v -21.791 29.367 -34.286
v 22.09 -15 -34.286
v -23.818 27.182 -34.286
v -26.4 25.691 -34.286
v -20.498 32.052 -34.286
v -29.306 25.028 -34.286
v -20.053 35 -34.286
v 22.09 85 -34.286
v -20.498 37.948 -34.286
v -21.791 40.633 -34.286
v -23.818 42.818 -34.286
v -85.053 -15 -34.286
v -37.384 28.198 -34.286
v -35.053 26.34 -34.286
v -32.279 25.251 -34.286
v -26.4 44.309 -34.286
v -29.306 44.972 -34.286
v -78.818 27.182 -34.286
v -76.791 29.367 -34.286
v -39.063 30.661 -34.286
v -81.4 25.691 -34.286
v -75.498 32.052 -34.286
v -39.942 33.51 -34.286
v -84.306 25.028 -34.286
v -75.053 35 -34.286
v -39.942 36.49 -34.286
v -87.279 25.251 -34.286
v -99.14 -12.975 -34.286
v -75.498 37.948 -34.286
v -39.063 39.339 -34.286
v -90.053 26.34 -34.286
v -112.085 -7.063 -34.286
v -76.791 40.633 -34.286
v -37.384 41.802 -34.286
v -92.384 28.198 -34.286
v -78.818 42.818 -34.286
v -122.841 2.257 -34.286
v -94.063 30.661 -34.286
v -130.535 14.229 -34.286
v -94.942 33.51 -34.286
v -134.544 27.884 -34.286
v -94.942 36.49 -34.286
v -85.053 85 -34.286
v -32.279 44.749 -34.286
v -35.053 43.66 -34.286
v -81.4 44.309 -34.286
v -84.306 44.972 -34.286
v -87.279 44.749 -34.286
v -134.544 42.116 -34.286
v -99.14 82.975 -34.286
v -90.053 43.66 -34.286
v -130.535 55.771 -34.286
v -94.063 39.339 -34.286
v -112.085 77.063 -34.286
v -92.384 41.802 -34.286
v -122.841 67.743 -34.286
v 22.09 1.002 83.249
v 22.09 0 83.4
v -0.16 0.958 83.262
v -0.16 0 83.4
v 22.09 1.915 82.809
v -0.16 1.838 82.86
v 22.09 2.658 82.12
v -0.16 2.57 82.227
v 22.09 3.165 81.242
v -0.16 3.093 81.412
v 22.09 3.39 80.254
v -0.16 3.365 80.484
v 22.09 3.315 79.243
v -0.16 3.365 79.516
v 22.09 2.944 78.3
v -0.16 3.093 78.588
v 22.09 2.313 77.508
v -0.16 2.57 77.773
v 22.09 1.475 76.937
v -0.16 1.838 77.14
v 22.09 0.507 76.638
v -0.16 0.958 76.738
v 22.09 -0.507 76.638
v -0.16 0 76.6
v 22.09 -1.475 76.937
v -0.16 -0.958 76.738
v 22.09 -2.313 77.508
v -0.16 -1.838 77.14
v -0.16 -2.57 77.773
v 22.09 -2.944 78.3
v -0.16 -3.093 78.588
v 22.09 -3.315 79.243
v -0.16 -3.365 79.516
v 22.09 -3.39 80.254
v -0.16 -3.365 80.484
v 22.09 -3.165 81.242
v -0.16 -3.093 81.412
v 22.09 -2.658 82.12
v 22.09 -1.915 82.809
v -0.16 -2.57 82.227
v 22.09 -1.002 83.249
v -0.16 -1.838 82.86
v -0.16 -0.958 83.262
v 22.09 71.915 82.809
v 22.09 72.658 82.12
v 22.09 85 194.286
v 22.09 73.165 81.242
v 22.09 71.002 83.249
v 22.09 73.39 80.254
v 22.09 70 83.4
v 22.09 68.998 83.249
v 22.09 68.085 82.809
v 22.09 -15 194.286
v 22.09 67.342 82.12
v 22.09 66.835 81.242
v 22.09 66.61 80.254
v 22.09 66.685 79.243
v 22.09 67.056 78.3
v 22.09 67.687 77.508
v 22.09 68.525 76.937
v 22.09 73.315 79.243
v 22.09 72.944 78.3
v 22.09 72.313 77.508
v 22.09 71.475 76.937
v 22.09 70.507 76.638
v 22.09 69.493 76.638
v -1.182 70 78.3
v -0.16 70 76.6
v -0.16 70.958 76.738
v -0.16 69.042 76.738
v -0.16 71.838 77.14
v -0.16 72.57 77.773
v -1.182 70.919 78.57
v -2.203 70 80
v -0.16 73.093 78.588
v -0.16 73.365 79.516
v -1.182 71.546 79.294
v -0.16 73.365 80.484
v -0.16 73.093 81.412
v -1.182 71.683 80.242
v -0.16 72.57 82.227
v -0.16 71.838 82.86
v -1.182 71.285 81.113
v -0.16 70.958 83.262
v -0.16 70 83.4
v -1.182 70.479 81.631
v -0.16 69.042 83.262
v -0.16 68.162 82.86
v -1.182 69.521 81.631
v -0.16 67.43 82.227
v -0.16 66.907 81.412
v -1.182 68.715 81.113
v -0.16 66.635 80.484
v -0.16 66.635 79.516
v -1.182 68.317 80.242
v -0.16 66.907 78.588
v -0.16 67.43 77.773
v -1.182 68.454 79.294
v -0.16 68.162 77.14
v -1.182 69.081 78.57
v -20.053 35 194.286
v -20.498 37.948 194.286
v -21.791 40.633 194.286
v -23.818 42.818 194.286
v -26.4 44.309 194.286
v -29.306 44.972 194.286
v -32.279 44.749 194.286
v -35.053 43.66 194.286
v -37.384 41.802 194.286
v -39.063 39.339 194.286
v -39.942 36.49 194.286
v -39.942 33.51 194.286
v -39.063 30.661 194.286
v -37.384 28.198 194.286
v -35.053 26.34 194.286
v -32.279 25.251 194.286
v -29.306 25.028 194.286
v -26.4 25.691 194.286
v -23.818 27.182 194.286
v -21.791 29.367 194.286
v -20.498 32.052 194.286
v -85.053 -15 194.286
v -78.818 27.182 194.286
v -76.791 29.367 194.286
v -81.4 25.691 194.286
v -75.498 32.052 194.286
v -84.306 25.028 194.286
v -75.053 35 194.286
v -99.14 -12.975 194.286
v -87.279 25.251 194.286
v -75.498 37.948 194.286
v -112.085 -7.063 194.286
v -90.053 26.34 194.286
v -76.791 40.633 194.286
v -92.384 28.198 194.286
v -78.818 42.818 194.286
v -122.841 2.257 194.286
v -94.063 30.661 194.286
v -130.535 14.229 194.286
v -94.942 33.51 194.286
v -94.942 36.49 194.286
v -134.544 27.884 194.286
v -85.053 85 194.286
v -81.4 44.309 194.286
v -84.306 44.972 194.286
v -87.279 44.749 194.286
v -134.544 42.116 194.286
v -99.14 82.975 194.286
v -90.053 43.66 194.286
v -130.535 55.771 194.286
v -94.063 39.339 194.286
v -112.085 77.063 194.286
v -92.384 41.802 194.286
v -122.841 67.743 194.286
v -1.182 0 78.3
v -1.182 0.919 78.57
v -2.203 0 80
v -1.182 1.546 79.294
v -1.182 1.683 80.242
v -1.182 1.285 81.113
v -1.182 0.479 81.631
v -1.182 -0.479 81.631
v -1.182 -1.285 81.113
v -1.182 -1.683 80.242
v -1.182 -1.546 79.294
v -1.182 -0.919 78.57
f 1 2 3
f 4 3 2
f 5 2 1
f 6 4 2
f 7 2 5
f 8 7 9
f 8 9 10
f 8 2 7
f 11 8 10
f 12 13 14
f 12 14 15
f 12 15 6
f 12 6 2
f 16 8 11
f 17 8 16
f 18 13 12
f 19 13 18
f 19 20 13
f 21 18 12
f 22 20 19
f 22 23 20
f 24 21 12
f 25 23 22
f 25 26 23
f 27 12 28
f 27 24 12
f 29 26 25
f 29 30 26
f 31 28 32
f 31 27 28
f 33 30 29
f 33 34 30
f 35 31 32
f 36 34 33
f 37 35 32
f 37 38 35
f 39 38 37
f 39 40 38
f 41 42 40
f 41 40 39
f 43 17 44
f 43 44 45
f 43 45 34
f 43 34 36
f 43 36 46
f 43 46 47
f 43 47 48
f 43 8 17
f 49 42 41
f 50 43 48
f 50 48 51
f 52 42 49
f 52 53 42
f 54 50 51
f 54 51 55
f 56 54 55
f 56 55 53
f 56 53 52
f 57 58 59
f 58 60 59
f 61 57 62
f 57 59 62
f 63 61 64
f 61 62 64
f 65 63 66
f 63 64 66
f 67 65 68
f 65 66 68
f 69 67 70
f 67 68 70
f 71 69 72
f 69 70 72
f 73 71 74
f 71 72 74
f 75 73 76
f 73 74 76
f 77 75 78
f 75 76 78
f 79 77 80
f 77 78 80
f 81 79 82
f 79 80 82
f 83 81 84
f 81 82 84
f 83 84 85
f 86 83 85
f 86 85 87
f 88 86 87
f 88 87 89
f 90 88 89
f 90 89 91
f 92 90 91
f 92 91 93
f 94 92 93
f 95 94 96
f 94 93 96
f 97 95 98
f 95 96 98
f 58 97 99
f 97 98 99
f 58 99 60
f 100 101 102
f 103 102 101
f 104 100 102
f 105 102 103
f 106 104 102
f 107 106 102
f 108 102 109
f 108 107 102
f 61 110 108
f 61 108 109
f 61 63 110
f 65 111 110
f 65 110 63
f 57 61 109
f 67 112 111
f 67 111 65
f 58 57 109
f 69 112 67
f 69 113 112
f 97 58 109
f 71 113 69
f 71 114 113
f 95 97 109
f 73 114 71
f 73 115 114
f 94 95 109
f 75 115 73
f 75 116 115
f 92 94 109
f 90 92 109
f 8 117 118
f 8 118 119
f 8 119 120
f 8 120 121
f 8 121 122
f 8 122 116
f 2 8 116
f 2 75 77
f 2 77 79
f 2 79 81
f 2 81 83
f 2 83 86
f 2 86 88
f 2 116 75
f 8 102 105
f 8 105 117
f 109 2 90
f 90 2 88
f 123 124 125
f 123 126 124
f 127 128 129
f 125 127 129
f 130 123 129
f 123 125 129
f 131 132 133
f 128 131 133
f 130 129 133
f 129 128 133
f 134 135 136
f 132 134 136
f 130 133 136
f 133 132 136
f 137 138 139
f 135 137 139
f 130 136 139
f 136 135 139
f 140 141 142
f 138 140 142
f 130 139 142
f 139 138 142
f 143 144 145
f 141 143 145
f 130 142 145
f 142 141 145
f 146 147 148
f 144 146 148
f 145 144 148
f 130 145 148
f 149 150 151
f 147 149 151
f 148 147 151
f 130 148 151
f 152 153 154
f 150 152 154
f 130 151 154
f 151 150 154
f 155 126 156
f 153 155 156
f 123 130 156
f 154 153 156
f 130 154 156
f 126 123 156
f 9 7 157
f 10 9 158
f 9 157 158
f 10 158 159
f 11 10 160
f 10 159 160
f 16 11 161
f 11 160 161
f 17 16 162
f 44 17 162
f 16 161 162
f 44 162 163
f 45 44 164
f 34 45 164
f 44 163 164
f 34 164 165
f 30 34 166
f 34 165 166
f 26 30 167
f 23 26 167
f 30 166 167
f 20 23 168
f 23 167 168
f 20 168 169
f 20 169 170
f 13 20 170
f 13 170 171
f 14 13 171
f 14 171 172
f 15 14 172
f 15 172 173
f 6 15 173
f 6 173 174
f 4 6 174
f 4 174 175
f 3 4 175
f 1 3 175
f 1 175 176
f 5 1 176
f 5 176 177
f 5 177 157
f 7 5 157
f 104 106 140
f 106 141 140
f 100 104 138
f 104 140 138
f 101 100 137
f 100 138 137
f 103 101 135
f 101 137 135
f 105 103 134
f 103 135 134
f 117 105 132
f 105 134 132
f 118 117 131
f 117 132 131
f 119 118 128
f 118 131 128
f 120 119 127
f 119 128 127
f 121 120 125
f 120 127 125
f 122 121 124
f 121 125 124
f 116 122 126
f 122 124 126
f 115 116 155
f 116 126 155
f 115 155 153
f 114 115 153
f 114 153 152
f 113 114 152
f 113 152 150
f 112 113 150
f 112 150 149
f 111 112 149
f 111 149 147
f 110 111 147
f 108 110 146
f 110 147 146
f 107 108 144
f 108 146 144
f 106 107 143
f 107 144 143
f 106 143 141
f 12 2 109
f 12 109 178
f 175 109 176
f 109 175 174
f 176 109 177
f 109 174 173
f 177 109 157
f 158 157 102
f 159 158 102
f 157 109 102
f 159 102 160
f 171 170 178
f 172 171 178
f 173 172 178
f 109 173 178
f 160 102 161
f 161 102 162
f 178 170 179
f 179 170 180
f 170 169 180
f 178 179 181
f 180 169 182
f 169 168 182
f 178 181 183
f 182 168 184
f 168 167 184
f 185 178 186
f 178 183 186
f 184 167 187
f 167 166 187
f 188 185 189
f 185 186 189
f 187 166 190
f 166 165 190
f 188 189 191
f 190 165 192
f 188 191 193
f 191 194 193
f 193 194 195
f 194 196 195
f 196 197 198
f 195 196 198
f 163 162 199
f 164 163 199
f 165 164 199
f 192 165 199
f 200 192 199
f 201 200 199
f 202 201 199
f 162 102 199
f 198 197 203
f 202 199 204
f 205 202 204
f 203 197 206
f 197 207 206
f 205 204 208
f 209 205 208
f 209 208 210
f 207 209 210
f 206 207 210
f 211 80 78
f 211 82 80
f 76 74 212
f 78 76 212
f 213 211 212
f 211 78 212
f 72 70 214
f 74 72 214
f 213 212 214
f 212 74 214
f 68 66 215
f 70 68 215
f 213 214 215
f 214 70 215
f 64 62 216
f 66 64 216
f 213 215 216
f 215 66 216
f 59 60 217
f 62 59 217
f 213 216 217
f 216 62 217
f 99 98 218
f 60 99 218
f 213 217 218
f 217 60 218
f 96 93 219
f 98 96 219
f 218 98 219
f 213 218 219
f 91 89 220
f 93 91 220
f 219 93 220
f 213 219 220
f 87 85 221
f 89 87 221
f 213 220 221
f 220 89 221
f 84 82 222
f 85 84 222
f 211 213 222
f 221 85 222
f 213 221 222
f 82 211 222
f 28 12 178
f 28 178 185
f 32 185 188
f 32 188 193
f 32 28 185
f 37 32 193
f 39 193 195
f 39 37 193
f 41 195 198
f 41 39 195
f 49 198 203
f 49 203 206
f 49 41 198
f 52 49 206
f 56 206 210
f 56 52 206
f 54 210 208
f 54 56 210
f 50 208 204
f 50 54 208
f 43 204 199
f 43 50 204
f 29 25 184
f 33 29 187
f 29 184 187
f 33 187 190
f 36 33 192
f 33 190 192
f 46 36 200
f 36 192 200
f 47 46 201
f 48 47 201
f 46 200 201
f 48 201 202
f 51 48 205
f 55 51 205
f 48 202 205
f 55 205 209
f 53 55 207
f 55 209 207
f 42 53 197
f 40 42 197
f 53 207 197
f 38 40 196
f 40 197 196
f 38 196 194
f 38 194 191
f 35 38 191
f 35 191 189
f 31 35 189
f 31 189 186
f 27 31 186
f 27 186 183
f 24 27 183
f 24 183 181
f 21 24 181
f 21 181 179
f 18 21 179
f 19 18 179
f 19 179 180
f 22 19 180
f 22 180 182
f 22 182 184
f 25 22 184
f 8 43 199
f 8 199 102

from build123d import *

# Parameters (mm, degrees)
BOSS_EXTRUDE1_DEPTH    = 160
SCALE1_SCALE           = 1.428571429
F_20_0MM_DOWEL_HOLE1_D = 20
M8_TAPPED_HOLE1_D      = 6.8
M8_TAPPED_HOLE1_DEPTH  = 22.25
M8_TAPPED_HOLE1_TIP    = 2.042926105


with BuildPart() as part:
    # Sketch1 → Boss-Extrude1 (new body)
    with BuildSketch(Plane.XY):
        with BuildLine():
            Line((0, 0), (-75, 0))
            ThreePointArc((-75, 0), (-110, 35), (-75, 70))
            Line((-75, 70), (0, 70))
            Line((0, 70), (0, 0))
        make_face()
    extrude(amount=BOSS_EXTRUDE1_DEPTH)


with BuildPart() as part_1:
    # Scale1: scaled about (-51.542183312, 35, 80)
    add(part.part.scale(SCALE1_SCALE).moved(Location((22.089507134, -15, -34.285714286))))

    # Ø20.0mm Dowel Hole1 (through all)
    with Locations(Plane(origin=(-30.053350009, 35, -34.285714286), x_dir=(-1, 0, 0), z_dir=(0, 0, -1))):
        with Locations((0, 0), (55, 0)):
            Hole(F_20_0MM_DOWEL_HOLE1_D / 2)

    # M8 Tapped Hole1
    with Locations(Plane(origin=(22.089507134, 0, 0), x_dir=(0, 0, -1), z_dir=(1, 0, 0))):
        with Locations((-80, 70), (-80, 0)):
            Hole(M8_TAPPED_HOLE1_D / 2, depth=M8_TAPPED_HOLE1_DEPTH)
            with Locations((0, 0, -(M8_TAPPED_HOLE1_DEPTH + M8_TAPPED_HOLE1_TIP / 2))):  # 118° drill point
                Cone(0, M8_TAPPED_HOLE1_D / 2, M8_TAPPED_HOLE1_TIP, mode=Mode.SUBTRACT)


solid = part_1.part
